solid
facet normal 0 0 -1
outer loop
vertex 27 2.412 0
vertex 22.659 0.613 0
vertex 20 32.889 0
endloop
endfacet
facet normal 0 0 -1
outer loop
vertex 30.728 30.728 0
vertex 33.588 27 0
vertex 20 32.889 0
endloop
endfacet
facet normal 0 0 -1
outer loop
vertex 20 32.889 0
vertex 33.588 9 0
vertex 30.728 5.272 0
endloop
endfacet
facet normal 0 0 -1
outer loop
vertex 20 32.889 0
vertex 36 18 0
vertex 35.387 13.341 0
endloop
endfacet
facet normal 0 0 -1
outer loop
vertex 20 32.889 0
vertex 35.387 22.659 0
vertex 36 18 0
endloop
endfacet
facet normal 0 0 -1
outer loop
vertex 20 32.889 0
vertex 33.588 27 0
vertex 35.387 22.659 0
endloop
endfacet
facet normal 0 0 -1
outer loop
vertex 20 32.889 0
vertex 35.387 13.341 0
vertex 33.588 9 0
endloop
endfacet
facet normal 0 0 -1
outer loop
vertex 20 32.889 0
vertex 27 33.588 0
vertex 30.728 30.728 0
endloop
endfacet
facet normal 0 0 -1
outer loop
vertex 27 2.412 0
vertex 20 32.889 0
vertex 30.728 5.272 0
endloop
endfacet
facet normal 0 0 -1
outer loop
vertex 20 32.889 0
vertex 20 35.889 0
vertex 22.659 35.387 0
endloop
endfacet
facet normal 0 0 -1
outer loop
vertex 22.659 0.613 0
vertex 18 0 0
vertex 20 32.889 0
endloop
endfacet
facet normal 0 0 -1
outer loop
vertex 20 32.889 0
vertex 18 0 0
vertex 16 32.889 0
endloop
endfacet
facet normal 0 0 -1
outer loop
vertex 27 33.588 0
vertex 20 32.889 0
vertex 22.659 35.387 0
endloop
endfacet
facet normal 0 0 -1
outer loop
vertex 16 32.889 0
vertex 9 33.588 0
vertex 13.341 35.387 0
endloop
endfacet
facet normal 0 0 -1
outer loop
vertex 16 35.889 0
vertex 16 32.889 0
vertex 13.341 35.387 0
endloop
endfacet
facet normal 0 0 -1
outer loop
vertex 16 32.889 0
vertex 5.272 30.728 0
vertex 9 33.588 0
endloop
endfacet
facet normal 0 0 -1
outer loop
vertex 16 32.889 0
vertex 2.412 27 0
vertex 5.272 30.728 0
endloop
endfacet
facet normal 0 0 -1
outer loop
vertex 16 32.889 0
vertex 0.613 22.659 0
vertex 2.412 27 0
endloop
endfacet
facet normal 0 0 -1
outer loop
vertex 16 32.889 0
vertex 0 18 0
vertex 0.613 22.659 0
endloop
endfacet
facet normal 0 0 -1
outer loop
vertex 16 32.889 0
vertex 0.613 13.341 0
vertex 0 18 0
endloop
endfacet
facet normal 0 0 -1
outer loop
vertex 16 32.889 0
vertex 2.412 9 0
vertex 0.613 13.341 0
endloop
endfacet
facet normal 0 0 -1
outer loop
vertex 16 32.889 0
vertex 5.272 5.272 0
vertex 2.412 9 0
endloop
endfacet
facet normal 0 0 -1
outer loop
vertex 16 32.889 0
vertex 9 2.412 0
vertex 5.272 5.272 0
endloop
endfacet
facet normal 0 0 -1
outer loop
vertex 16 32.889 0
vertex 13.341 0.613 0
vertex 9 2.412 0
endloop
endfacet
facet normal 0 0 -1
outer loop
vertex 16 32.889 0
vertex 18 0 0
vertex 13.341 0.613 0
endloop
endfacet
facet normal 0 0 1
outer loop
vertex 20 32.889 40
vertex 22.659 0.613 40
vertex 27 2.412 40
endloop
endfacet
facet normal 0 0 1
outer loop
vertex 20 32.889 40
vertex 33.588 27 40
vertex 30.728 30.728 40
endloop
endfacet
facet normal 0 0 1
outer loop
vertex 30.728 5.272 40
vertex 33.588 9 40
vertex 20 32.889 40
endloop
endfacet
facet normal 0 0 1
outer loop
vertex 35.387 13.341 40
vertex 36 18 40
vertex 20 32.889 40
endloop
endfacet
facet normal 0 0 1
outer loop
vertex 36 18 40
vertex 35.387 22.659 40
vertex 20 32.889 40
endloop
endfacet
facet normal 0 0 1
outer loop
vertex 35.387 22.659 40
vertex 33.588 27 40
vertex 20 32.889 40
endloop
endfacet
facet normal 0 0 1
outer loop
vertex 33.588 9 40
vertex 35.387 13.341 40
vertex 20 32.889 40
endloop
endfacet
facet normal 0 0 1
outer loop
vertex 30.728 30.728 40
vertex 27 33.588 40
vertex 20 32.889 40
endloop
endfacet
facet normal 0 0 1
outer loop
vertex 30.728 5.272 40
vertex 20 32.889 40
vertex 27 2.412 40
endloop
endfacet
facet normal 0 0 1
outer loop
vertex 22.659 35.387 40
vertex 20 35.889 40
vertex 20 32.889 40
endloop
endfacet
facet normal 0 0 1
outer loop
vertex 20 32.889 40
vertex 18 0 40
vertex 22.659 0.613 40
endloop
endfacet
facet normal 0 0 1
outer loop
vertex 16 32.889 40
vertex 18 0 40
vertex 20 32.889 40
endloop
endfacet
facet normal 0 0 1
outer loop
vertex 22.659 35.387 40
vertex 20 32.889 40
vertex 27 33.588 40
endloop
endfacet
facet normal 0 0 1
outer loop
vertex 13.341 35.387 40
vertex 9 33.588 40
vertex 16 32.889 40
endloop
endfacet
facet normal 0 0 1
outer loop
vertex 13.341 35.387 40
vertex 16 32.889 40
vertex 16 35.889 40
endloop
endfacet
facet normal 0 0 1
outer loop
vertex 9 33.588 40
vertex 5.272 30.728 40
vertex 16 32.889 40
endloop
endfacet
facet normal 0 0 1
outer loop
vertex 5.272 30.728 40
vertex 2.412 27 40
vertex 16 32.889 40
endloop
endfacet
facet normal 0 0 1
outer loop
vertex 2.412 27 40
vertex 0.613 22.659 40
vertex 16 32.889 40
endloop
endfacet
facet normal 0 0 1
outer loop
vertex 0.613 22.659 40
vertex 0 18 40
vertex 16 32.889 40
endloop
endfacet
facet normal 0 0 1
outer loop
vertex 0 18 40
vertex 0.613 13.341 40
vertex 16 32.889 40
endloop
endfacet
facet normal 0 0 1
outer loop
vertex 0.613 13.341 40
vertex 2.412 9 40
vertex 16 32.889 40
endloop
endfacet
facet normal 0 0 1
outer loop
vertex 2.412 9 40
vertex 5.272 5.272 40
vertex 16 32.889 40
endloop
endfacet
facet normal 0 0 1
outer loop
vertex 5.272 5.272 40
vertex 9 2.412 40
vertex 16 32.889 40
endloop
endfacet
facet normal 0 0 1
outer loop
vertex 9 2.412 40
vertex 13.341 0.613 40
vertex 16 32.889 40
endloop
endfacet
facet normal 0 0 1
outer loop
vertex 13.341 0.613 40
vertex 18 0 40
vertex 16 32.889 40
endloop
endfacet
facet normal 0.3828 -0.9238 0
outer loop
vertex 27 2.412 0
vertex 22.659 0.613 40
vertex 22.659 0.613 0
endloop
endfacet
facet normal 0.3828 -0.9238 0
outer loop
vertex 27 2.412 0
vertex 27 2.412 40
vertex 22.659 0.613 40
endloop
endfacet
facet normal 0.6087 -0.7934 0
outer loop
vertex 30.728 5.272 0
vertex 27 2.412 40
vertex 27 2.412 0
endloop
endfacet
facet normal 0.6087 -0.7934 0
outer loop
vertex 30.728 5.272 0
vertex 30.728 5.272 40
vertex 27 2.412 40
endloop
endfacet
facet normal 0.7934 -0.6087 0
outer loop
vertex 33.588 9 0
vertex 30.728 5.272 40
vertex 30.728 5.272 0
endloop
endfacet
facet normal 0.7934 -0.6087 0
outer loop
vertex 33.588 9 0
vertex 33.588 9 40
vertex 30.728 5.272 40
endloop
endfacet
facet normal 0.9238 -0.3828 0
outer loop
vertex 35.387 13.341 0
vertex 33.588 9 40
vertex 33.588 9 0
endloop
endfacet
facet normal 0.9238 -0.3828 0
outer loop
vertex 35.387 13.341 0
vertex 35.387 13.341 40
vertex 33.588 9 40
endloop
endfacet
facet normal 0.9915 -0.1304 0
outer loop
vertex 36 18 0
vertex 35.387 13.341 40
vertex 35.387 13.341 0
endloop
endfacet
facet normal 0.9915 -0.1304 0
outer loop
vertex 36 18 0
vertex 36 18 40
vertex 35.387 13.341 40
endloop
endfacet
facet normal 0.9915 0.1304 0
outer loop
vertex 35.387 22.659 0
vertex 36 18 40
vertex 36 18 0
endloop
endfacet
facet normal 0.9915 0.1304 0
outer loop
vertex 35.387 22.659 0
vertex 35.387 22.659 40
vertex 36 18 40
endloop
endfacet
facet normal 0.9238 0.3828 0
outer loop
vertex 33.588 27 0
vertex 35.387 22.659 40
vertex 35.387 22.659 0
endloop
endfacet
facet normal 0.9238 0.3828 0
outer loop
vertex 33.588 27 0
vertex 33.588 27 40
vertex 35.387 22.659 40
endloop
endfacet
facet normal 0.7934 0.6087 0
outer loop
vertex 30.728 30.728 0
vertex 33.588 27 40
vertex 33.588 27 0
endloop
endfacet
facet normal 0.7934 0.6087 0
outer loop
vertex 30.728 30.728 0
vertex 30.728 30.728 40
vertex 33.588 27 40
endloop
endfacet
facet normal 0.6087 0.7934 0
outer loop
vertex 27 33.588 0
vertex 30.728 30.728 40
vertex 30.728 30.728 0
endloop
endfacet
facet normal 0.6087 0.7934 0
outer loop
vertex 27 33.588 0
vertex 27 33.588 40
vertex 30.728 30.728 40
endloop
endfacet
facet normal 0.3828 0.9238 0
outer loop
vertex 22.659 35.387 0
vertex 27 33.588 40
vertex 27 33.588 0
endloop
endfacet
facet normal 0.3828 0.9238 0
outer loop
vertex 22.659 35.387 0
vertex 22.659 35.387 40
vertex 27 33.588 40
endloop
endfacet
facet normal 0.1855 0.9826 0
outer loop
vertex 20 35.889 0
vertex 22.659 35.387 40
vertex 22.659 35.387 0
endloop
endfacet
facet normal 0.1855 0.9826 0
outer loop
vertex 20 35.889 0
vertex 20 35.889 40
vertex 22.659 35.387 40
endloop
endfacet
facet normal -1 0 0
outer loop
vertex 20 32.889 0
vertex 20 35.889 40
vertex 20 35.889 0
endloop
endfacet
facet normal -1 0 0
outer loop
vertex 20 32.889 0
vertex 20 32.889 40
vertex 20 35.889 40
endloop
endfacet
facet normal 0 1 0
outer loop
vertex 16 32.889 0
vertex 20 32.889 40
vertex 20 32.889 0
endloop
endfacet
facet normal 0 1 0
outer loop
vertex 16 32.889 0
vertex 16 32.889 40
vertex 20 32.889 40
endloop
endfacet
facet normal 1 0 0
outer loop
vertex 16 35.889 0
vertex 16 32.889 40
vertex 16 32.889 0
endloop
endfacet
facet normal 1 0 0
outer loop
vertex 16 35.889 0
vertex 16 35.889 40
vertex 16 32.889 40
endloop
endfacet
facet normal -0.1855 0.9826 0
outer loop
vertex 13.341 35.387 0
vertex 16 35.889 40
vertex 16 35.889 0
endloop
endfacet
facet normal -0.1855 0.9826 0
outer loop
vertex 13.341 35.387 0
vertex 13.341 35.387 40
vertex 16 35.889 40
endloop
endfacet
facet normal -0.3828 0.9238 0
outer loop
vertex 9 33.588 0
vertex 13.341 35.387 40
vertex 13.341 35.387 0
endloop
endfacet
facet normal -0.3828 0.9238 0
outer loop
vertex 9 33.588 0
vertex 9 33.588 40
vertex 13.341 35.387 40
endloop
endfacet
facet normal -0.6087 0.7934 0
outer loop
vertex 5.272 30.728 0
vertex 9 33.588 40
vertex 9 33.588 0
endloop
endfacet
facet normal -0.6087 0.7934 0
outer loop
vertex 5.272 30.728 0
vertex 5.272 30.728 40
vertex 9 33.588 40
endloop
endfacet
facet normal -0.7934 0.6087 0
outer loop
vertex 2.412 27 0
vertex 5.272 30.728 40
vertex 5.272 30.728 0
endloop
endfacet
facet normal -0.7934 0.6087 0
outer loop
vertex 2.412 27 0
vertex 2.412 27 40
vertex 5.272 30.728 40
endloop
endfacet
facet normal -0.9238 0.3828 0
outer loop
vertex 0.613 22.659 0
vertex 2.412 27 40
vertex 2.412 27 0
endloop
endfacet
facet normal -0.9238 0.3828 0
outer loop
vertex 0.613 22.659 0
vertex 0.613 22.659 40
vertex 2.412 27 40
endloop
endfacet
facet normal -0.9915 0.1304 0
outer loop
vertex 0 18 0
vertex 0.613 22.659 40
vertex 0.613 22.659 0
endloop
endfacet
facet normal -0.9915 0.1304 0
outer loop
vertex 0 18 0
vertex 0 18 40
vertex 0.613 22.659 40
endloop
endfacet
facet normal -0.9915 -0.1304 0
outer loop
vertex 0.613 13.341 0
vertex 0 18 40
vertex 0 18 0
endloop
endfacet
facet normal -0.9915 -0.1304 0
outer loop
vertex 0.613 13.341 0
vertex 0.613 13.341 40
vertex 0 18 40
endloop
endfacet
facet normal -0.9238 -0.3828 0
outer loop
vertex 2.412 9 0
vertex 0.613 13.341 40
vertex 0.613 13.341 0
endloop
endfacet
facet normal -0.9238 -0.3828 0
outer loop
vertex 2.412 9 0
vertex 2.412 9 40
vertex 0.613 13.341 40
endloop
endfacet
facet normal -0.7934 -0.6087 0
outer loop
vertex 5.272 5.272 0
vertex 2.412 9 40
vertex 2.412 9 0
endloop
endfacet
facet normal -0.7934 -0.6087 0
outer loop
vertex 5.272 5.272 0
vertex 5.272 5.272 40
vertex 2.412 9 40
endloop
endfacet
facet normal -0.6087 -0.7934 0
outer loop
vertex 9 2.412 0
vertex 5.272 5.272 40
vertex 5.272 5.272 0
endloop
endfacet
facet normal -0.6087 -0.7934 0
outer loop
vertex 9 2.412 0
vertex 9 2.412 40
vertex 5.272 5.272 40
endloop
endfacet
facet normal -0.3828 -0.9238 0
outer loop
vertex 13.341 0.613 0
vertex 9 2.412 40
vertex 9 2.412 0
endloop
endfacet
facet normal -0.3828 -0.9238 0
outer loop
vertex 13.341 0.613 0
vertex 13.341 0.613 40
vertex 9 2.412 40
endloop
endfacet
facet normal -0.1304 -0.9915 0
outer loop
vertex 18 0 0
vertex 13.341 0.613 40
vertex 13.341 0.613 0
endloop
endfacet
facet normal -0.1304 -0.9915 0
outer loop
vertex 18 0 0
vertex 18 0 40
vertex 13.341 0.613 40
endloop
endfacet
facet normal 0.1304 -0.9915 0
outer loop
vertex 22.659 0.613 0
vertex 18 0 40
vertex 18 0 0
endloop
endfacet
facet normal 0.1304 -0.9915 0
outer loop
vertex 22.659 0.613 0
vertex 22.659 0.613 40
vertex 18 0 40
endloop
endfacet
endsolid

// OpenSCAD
$fn = 32;

// ----------------------------------------------------------------------
// Keyway shaft: d36 shaft, key 4 x 3 mm
// ----------------------------------------------------------------------

// --- parameters (mm) ---
shaft_r = 18;             // shaft radius
key_w = 4;                // keyway width
key_d = 3;                // keyway depth below the surface line
plate_t = 40;             // shaft length, Z (extrusion height)

shaft_d = 2 * shaft_r;  // shaft diameter
circle_step = 15;  // polygon sampling step, degrees

profile = [[13.341, 35.387], [9, 33.588], [5.272, 30.728], [2.412, 27], [0.613, 22.659], [0, 18], [0.613, 13.341], [2.412, 9], [5.272, 5.272], [9, 2.412], [13.341, 0.613], [18, 0], [22.659, 0.613], [27, 2.412], [30.728, 5.272], [33.588, 9], [35.387, 13.341], [36, 18], [35.387, 22.659], [33.588, 27], [30.728, 30.728], [27, 33.588], [22.659, 35.387], [20, 35.889], [20, 32.889], [16, 32.889], [16, 35.889]];  // primary outline, 27 points, counter clockwise

// --- the one profile operation ---
linear_extrude(height = plate_t) polygon(points = profile);
